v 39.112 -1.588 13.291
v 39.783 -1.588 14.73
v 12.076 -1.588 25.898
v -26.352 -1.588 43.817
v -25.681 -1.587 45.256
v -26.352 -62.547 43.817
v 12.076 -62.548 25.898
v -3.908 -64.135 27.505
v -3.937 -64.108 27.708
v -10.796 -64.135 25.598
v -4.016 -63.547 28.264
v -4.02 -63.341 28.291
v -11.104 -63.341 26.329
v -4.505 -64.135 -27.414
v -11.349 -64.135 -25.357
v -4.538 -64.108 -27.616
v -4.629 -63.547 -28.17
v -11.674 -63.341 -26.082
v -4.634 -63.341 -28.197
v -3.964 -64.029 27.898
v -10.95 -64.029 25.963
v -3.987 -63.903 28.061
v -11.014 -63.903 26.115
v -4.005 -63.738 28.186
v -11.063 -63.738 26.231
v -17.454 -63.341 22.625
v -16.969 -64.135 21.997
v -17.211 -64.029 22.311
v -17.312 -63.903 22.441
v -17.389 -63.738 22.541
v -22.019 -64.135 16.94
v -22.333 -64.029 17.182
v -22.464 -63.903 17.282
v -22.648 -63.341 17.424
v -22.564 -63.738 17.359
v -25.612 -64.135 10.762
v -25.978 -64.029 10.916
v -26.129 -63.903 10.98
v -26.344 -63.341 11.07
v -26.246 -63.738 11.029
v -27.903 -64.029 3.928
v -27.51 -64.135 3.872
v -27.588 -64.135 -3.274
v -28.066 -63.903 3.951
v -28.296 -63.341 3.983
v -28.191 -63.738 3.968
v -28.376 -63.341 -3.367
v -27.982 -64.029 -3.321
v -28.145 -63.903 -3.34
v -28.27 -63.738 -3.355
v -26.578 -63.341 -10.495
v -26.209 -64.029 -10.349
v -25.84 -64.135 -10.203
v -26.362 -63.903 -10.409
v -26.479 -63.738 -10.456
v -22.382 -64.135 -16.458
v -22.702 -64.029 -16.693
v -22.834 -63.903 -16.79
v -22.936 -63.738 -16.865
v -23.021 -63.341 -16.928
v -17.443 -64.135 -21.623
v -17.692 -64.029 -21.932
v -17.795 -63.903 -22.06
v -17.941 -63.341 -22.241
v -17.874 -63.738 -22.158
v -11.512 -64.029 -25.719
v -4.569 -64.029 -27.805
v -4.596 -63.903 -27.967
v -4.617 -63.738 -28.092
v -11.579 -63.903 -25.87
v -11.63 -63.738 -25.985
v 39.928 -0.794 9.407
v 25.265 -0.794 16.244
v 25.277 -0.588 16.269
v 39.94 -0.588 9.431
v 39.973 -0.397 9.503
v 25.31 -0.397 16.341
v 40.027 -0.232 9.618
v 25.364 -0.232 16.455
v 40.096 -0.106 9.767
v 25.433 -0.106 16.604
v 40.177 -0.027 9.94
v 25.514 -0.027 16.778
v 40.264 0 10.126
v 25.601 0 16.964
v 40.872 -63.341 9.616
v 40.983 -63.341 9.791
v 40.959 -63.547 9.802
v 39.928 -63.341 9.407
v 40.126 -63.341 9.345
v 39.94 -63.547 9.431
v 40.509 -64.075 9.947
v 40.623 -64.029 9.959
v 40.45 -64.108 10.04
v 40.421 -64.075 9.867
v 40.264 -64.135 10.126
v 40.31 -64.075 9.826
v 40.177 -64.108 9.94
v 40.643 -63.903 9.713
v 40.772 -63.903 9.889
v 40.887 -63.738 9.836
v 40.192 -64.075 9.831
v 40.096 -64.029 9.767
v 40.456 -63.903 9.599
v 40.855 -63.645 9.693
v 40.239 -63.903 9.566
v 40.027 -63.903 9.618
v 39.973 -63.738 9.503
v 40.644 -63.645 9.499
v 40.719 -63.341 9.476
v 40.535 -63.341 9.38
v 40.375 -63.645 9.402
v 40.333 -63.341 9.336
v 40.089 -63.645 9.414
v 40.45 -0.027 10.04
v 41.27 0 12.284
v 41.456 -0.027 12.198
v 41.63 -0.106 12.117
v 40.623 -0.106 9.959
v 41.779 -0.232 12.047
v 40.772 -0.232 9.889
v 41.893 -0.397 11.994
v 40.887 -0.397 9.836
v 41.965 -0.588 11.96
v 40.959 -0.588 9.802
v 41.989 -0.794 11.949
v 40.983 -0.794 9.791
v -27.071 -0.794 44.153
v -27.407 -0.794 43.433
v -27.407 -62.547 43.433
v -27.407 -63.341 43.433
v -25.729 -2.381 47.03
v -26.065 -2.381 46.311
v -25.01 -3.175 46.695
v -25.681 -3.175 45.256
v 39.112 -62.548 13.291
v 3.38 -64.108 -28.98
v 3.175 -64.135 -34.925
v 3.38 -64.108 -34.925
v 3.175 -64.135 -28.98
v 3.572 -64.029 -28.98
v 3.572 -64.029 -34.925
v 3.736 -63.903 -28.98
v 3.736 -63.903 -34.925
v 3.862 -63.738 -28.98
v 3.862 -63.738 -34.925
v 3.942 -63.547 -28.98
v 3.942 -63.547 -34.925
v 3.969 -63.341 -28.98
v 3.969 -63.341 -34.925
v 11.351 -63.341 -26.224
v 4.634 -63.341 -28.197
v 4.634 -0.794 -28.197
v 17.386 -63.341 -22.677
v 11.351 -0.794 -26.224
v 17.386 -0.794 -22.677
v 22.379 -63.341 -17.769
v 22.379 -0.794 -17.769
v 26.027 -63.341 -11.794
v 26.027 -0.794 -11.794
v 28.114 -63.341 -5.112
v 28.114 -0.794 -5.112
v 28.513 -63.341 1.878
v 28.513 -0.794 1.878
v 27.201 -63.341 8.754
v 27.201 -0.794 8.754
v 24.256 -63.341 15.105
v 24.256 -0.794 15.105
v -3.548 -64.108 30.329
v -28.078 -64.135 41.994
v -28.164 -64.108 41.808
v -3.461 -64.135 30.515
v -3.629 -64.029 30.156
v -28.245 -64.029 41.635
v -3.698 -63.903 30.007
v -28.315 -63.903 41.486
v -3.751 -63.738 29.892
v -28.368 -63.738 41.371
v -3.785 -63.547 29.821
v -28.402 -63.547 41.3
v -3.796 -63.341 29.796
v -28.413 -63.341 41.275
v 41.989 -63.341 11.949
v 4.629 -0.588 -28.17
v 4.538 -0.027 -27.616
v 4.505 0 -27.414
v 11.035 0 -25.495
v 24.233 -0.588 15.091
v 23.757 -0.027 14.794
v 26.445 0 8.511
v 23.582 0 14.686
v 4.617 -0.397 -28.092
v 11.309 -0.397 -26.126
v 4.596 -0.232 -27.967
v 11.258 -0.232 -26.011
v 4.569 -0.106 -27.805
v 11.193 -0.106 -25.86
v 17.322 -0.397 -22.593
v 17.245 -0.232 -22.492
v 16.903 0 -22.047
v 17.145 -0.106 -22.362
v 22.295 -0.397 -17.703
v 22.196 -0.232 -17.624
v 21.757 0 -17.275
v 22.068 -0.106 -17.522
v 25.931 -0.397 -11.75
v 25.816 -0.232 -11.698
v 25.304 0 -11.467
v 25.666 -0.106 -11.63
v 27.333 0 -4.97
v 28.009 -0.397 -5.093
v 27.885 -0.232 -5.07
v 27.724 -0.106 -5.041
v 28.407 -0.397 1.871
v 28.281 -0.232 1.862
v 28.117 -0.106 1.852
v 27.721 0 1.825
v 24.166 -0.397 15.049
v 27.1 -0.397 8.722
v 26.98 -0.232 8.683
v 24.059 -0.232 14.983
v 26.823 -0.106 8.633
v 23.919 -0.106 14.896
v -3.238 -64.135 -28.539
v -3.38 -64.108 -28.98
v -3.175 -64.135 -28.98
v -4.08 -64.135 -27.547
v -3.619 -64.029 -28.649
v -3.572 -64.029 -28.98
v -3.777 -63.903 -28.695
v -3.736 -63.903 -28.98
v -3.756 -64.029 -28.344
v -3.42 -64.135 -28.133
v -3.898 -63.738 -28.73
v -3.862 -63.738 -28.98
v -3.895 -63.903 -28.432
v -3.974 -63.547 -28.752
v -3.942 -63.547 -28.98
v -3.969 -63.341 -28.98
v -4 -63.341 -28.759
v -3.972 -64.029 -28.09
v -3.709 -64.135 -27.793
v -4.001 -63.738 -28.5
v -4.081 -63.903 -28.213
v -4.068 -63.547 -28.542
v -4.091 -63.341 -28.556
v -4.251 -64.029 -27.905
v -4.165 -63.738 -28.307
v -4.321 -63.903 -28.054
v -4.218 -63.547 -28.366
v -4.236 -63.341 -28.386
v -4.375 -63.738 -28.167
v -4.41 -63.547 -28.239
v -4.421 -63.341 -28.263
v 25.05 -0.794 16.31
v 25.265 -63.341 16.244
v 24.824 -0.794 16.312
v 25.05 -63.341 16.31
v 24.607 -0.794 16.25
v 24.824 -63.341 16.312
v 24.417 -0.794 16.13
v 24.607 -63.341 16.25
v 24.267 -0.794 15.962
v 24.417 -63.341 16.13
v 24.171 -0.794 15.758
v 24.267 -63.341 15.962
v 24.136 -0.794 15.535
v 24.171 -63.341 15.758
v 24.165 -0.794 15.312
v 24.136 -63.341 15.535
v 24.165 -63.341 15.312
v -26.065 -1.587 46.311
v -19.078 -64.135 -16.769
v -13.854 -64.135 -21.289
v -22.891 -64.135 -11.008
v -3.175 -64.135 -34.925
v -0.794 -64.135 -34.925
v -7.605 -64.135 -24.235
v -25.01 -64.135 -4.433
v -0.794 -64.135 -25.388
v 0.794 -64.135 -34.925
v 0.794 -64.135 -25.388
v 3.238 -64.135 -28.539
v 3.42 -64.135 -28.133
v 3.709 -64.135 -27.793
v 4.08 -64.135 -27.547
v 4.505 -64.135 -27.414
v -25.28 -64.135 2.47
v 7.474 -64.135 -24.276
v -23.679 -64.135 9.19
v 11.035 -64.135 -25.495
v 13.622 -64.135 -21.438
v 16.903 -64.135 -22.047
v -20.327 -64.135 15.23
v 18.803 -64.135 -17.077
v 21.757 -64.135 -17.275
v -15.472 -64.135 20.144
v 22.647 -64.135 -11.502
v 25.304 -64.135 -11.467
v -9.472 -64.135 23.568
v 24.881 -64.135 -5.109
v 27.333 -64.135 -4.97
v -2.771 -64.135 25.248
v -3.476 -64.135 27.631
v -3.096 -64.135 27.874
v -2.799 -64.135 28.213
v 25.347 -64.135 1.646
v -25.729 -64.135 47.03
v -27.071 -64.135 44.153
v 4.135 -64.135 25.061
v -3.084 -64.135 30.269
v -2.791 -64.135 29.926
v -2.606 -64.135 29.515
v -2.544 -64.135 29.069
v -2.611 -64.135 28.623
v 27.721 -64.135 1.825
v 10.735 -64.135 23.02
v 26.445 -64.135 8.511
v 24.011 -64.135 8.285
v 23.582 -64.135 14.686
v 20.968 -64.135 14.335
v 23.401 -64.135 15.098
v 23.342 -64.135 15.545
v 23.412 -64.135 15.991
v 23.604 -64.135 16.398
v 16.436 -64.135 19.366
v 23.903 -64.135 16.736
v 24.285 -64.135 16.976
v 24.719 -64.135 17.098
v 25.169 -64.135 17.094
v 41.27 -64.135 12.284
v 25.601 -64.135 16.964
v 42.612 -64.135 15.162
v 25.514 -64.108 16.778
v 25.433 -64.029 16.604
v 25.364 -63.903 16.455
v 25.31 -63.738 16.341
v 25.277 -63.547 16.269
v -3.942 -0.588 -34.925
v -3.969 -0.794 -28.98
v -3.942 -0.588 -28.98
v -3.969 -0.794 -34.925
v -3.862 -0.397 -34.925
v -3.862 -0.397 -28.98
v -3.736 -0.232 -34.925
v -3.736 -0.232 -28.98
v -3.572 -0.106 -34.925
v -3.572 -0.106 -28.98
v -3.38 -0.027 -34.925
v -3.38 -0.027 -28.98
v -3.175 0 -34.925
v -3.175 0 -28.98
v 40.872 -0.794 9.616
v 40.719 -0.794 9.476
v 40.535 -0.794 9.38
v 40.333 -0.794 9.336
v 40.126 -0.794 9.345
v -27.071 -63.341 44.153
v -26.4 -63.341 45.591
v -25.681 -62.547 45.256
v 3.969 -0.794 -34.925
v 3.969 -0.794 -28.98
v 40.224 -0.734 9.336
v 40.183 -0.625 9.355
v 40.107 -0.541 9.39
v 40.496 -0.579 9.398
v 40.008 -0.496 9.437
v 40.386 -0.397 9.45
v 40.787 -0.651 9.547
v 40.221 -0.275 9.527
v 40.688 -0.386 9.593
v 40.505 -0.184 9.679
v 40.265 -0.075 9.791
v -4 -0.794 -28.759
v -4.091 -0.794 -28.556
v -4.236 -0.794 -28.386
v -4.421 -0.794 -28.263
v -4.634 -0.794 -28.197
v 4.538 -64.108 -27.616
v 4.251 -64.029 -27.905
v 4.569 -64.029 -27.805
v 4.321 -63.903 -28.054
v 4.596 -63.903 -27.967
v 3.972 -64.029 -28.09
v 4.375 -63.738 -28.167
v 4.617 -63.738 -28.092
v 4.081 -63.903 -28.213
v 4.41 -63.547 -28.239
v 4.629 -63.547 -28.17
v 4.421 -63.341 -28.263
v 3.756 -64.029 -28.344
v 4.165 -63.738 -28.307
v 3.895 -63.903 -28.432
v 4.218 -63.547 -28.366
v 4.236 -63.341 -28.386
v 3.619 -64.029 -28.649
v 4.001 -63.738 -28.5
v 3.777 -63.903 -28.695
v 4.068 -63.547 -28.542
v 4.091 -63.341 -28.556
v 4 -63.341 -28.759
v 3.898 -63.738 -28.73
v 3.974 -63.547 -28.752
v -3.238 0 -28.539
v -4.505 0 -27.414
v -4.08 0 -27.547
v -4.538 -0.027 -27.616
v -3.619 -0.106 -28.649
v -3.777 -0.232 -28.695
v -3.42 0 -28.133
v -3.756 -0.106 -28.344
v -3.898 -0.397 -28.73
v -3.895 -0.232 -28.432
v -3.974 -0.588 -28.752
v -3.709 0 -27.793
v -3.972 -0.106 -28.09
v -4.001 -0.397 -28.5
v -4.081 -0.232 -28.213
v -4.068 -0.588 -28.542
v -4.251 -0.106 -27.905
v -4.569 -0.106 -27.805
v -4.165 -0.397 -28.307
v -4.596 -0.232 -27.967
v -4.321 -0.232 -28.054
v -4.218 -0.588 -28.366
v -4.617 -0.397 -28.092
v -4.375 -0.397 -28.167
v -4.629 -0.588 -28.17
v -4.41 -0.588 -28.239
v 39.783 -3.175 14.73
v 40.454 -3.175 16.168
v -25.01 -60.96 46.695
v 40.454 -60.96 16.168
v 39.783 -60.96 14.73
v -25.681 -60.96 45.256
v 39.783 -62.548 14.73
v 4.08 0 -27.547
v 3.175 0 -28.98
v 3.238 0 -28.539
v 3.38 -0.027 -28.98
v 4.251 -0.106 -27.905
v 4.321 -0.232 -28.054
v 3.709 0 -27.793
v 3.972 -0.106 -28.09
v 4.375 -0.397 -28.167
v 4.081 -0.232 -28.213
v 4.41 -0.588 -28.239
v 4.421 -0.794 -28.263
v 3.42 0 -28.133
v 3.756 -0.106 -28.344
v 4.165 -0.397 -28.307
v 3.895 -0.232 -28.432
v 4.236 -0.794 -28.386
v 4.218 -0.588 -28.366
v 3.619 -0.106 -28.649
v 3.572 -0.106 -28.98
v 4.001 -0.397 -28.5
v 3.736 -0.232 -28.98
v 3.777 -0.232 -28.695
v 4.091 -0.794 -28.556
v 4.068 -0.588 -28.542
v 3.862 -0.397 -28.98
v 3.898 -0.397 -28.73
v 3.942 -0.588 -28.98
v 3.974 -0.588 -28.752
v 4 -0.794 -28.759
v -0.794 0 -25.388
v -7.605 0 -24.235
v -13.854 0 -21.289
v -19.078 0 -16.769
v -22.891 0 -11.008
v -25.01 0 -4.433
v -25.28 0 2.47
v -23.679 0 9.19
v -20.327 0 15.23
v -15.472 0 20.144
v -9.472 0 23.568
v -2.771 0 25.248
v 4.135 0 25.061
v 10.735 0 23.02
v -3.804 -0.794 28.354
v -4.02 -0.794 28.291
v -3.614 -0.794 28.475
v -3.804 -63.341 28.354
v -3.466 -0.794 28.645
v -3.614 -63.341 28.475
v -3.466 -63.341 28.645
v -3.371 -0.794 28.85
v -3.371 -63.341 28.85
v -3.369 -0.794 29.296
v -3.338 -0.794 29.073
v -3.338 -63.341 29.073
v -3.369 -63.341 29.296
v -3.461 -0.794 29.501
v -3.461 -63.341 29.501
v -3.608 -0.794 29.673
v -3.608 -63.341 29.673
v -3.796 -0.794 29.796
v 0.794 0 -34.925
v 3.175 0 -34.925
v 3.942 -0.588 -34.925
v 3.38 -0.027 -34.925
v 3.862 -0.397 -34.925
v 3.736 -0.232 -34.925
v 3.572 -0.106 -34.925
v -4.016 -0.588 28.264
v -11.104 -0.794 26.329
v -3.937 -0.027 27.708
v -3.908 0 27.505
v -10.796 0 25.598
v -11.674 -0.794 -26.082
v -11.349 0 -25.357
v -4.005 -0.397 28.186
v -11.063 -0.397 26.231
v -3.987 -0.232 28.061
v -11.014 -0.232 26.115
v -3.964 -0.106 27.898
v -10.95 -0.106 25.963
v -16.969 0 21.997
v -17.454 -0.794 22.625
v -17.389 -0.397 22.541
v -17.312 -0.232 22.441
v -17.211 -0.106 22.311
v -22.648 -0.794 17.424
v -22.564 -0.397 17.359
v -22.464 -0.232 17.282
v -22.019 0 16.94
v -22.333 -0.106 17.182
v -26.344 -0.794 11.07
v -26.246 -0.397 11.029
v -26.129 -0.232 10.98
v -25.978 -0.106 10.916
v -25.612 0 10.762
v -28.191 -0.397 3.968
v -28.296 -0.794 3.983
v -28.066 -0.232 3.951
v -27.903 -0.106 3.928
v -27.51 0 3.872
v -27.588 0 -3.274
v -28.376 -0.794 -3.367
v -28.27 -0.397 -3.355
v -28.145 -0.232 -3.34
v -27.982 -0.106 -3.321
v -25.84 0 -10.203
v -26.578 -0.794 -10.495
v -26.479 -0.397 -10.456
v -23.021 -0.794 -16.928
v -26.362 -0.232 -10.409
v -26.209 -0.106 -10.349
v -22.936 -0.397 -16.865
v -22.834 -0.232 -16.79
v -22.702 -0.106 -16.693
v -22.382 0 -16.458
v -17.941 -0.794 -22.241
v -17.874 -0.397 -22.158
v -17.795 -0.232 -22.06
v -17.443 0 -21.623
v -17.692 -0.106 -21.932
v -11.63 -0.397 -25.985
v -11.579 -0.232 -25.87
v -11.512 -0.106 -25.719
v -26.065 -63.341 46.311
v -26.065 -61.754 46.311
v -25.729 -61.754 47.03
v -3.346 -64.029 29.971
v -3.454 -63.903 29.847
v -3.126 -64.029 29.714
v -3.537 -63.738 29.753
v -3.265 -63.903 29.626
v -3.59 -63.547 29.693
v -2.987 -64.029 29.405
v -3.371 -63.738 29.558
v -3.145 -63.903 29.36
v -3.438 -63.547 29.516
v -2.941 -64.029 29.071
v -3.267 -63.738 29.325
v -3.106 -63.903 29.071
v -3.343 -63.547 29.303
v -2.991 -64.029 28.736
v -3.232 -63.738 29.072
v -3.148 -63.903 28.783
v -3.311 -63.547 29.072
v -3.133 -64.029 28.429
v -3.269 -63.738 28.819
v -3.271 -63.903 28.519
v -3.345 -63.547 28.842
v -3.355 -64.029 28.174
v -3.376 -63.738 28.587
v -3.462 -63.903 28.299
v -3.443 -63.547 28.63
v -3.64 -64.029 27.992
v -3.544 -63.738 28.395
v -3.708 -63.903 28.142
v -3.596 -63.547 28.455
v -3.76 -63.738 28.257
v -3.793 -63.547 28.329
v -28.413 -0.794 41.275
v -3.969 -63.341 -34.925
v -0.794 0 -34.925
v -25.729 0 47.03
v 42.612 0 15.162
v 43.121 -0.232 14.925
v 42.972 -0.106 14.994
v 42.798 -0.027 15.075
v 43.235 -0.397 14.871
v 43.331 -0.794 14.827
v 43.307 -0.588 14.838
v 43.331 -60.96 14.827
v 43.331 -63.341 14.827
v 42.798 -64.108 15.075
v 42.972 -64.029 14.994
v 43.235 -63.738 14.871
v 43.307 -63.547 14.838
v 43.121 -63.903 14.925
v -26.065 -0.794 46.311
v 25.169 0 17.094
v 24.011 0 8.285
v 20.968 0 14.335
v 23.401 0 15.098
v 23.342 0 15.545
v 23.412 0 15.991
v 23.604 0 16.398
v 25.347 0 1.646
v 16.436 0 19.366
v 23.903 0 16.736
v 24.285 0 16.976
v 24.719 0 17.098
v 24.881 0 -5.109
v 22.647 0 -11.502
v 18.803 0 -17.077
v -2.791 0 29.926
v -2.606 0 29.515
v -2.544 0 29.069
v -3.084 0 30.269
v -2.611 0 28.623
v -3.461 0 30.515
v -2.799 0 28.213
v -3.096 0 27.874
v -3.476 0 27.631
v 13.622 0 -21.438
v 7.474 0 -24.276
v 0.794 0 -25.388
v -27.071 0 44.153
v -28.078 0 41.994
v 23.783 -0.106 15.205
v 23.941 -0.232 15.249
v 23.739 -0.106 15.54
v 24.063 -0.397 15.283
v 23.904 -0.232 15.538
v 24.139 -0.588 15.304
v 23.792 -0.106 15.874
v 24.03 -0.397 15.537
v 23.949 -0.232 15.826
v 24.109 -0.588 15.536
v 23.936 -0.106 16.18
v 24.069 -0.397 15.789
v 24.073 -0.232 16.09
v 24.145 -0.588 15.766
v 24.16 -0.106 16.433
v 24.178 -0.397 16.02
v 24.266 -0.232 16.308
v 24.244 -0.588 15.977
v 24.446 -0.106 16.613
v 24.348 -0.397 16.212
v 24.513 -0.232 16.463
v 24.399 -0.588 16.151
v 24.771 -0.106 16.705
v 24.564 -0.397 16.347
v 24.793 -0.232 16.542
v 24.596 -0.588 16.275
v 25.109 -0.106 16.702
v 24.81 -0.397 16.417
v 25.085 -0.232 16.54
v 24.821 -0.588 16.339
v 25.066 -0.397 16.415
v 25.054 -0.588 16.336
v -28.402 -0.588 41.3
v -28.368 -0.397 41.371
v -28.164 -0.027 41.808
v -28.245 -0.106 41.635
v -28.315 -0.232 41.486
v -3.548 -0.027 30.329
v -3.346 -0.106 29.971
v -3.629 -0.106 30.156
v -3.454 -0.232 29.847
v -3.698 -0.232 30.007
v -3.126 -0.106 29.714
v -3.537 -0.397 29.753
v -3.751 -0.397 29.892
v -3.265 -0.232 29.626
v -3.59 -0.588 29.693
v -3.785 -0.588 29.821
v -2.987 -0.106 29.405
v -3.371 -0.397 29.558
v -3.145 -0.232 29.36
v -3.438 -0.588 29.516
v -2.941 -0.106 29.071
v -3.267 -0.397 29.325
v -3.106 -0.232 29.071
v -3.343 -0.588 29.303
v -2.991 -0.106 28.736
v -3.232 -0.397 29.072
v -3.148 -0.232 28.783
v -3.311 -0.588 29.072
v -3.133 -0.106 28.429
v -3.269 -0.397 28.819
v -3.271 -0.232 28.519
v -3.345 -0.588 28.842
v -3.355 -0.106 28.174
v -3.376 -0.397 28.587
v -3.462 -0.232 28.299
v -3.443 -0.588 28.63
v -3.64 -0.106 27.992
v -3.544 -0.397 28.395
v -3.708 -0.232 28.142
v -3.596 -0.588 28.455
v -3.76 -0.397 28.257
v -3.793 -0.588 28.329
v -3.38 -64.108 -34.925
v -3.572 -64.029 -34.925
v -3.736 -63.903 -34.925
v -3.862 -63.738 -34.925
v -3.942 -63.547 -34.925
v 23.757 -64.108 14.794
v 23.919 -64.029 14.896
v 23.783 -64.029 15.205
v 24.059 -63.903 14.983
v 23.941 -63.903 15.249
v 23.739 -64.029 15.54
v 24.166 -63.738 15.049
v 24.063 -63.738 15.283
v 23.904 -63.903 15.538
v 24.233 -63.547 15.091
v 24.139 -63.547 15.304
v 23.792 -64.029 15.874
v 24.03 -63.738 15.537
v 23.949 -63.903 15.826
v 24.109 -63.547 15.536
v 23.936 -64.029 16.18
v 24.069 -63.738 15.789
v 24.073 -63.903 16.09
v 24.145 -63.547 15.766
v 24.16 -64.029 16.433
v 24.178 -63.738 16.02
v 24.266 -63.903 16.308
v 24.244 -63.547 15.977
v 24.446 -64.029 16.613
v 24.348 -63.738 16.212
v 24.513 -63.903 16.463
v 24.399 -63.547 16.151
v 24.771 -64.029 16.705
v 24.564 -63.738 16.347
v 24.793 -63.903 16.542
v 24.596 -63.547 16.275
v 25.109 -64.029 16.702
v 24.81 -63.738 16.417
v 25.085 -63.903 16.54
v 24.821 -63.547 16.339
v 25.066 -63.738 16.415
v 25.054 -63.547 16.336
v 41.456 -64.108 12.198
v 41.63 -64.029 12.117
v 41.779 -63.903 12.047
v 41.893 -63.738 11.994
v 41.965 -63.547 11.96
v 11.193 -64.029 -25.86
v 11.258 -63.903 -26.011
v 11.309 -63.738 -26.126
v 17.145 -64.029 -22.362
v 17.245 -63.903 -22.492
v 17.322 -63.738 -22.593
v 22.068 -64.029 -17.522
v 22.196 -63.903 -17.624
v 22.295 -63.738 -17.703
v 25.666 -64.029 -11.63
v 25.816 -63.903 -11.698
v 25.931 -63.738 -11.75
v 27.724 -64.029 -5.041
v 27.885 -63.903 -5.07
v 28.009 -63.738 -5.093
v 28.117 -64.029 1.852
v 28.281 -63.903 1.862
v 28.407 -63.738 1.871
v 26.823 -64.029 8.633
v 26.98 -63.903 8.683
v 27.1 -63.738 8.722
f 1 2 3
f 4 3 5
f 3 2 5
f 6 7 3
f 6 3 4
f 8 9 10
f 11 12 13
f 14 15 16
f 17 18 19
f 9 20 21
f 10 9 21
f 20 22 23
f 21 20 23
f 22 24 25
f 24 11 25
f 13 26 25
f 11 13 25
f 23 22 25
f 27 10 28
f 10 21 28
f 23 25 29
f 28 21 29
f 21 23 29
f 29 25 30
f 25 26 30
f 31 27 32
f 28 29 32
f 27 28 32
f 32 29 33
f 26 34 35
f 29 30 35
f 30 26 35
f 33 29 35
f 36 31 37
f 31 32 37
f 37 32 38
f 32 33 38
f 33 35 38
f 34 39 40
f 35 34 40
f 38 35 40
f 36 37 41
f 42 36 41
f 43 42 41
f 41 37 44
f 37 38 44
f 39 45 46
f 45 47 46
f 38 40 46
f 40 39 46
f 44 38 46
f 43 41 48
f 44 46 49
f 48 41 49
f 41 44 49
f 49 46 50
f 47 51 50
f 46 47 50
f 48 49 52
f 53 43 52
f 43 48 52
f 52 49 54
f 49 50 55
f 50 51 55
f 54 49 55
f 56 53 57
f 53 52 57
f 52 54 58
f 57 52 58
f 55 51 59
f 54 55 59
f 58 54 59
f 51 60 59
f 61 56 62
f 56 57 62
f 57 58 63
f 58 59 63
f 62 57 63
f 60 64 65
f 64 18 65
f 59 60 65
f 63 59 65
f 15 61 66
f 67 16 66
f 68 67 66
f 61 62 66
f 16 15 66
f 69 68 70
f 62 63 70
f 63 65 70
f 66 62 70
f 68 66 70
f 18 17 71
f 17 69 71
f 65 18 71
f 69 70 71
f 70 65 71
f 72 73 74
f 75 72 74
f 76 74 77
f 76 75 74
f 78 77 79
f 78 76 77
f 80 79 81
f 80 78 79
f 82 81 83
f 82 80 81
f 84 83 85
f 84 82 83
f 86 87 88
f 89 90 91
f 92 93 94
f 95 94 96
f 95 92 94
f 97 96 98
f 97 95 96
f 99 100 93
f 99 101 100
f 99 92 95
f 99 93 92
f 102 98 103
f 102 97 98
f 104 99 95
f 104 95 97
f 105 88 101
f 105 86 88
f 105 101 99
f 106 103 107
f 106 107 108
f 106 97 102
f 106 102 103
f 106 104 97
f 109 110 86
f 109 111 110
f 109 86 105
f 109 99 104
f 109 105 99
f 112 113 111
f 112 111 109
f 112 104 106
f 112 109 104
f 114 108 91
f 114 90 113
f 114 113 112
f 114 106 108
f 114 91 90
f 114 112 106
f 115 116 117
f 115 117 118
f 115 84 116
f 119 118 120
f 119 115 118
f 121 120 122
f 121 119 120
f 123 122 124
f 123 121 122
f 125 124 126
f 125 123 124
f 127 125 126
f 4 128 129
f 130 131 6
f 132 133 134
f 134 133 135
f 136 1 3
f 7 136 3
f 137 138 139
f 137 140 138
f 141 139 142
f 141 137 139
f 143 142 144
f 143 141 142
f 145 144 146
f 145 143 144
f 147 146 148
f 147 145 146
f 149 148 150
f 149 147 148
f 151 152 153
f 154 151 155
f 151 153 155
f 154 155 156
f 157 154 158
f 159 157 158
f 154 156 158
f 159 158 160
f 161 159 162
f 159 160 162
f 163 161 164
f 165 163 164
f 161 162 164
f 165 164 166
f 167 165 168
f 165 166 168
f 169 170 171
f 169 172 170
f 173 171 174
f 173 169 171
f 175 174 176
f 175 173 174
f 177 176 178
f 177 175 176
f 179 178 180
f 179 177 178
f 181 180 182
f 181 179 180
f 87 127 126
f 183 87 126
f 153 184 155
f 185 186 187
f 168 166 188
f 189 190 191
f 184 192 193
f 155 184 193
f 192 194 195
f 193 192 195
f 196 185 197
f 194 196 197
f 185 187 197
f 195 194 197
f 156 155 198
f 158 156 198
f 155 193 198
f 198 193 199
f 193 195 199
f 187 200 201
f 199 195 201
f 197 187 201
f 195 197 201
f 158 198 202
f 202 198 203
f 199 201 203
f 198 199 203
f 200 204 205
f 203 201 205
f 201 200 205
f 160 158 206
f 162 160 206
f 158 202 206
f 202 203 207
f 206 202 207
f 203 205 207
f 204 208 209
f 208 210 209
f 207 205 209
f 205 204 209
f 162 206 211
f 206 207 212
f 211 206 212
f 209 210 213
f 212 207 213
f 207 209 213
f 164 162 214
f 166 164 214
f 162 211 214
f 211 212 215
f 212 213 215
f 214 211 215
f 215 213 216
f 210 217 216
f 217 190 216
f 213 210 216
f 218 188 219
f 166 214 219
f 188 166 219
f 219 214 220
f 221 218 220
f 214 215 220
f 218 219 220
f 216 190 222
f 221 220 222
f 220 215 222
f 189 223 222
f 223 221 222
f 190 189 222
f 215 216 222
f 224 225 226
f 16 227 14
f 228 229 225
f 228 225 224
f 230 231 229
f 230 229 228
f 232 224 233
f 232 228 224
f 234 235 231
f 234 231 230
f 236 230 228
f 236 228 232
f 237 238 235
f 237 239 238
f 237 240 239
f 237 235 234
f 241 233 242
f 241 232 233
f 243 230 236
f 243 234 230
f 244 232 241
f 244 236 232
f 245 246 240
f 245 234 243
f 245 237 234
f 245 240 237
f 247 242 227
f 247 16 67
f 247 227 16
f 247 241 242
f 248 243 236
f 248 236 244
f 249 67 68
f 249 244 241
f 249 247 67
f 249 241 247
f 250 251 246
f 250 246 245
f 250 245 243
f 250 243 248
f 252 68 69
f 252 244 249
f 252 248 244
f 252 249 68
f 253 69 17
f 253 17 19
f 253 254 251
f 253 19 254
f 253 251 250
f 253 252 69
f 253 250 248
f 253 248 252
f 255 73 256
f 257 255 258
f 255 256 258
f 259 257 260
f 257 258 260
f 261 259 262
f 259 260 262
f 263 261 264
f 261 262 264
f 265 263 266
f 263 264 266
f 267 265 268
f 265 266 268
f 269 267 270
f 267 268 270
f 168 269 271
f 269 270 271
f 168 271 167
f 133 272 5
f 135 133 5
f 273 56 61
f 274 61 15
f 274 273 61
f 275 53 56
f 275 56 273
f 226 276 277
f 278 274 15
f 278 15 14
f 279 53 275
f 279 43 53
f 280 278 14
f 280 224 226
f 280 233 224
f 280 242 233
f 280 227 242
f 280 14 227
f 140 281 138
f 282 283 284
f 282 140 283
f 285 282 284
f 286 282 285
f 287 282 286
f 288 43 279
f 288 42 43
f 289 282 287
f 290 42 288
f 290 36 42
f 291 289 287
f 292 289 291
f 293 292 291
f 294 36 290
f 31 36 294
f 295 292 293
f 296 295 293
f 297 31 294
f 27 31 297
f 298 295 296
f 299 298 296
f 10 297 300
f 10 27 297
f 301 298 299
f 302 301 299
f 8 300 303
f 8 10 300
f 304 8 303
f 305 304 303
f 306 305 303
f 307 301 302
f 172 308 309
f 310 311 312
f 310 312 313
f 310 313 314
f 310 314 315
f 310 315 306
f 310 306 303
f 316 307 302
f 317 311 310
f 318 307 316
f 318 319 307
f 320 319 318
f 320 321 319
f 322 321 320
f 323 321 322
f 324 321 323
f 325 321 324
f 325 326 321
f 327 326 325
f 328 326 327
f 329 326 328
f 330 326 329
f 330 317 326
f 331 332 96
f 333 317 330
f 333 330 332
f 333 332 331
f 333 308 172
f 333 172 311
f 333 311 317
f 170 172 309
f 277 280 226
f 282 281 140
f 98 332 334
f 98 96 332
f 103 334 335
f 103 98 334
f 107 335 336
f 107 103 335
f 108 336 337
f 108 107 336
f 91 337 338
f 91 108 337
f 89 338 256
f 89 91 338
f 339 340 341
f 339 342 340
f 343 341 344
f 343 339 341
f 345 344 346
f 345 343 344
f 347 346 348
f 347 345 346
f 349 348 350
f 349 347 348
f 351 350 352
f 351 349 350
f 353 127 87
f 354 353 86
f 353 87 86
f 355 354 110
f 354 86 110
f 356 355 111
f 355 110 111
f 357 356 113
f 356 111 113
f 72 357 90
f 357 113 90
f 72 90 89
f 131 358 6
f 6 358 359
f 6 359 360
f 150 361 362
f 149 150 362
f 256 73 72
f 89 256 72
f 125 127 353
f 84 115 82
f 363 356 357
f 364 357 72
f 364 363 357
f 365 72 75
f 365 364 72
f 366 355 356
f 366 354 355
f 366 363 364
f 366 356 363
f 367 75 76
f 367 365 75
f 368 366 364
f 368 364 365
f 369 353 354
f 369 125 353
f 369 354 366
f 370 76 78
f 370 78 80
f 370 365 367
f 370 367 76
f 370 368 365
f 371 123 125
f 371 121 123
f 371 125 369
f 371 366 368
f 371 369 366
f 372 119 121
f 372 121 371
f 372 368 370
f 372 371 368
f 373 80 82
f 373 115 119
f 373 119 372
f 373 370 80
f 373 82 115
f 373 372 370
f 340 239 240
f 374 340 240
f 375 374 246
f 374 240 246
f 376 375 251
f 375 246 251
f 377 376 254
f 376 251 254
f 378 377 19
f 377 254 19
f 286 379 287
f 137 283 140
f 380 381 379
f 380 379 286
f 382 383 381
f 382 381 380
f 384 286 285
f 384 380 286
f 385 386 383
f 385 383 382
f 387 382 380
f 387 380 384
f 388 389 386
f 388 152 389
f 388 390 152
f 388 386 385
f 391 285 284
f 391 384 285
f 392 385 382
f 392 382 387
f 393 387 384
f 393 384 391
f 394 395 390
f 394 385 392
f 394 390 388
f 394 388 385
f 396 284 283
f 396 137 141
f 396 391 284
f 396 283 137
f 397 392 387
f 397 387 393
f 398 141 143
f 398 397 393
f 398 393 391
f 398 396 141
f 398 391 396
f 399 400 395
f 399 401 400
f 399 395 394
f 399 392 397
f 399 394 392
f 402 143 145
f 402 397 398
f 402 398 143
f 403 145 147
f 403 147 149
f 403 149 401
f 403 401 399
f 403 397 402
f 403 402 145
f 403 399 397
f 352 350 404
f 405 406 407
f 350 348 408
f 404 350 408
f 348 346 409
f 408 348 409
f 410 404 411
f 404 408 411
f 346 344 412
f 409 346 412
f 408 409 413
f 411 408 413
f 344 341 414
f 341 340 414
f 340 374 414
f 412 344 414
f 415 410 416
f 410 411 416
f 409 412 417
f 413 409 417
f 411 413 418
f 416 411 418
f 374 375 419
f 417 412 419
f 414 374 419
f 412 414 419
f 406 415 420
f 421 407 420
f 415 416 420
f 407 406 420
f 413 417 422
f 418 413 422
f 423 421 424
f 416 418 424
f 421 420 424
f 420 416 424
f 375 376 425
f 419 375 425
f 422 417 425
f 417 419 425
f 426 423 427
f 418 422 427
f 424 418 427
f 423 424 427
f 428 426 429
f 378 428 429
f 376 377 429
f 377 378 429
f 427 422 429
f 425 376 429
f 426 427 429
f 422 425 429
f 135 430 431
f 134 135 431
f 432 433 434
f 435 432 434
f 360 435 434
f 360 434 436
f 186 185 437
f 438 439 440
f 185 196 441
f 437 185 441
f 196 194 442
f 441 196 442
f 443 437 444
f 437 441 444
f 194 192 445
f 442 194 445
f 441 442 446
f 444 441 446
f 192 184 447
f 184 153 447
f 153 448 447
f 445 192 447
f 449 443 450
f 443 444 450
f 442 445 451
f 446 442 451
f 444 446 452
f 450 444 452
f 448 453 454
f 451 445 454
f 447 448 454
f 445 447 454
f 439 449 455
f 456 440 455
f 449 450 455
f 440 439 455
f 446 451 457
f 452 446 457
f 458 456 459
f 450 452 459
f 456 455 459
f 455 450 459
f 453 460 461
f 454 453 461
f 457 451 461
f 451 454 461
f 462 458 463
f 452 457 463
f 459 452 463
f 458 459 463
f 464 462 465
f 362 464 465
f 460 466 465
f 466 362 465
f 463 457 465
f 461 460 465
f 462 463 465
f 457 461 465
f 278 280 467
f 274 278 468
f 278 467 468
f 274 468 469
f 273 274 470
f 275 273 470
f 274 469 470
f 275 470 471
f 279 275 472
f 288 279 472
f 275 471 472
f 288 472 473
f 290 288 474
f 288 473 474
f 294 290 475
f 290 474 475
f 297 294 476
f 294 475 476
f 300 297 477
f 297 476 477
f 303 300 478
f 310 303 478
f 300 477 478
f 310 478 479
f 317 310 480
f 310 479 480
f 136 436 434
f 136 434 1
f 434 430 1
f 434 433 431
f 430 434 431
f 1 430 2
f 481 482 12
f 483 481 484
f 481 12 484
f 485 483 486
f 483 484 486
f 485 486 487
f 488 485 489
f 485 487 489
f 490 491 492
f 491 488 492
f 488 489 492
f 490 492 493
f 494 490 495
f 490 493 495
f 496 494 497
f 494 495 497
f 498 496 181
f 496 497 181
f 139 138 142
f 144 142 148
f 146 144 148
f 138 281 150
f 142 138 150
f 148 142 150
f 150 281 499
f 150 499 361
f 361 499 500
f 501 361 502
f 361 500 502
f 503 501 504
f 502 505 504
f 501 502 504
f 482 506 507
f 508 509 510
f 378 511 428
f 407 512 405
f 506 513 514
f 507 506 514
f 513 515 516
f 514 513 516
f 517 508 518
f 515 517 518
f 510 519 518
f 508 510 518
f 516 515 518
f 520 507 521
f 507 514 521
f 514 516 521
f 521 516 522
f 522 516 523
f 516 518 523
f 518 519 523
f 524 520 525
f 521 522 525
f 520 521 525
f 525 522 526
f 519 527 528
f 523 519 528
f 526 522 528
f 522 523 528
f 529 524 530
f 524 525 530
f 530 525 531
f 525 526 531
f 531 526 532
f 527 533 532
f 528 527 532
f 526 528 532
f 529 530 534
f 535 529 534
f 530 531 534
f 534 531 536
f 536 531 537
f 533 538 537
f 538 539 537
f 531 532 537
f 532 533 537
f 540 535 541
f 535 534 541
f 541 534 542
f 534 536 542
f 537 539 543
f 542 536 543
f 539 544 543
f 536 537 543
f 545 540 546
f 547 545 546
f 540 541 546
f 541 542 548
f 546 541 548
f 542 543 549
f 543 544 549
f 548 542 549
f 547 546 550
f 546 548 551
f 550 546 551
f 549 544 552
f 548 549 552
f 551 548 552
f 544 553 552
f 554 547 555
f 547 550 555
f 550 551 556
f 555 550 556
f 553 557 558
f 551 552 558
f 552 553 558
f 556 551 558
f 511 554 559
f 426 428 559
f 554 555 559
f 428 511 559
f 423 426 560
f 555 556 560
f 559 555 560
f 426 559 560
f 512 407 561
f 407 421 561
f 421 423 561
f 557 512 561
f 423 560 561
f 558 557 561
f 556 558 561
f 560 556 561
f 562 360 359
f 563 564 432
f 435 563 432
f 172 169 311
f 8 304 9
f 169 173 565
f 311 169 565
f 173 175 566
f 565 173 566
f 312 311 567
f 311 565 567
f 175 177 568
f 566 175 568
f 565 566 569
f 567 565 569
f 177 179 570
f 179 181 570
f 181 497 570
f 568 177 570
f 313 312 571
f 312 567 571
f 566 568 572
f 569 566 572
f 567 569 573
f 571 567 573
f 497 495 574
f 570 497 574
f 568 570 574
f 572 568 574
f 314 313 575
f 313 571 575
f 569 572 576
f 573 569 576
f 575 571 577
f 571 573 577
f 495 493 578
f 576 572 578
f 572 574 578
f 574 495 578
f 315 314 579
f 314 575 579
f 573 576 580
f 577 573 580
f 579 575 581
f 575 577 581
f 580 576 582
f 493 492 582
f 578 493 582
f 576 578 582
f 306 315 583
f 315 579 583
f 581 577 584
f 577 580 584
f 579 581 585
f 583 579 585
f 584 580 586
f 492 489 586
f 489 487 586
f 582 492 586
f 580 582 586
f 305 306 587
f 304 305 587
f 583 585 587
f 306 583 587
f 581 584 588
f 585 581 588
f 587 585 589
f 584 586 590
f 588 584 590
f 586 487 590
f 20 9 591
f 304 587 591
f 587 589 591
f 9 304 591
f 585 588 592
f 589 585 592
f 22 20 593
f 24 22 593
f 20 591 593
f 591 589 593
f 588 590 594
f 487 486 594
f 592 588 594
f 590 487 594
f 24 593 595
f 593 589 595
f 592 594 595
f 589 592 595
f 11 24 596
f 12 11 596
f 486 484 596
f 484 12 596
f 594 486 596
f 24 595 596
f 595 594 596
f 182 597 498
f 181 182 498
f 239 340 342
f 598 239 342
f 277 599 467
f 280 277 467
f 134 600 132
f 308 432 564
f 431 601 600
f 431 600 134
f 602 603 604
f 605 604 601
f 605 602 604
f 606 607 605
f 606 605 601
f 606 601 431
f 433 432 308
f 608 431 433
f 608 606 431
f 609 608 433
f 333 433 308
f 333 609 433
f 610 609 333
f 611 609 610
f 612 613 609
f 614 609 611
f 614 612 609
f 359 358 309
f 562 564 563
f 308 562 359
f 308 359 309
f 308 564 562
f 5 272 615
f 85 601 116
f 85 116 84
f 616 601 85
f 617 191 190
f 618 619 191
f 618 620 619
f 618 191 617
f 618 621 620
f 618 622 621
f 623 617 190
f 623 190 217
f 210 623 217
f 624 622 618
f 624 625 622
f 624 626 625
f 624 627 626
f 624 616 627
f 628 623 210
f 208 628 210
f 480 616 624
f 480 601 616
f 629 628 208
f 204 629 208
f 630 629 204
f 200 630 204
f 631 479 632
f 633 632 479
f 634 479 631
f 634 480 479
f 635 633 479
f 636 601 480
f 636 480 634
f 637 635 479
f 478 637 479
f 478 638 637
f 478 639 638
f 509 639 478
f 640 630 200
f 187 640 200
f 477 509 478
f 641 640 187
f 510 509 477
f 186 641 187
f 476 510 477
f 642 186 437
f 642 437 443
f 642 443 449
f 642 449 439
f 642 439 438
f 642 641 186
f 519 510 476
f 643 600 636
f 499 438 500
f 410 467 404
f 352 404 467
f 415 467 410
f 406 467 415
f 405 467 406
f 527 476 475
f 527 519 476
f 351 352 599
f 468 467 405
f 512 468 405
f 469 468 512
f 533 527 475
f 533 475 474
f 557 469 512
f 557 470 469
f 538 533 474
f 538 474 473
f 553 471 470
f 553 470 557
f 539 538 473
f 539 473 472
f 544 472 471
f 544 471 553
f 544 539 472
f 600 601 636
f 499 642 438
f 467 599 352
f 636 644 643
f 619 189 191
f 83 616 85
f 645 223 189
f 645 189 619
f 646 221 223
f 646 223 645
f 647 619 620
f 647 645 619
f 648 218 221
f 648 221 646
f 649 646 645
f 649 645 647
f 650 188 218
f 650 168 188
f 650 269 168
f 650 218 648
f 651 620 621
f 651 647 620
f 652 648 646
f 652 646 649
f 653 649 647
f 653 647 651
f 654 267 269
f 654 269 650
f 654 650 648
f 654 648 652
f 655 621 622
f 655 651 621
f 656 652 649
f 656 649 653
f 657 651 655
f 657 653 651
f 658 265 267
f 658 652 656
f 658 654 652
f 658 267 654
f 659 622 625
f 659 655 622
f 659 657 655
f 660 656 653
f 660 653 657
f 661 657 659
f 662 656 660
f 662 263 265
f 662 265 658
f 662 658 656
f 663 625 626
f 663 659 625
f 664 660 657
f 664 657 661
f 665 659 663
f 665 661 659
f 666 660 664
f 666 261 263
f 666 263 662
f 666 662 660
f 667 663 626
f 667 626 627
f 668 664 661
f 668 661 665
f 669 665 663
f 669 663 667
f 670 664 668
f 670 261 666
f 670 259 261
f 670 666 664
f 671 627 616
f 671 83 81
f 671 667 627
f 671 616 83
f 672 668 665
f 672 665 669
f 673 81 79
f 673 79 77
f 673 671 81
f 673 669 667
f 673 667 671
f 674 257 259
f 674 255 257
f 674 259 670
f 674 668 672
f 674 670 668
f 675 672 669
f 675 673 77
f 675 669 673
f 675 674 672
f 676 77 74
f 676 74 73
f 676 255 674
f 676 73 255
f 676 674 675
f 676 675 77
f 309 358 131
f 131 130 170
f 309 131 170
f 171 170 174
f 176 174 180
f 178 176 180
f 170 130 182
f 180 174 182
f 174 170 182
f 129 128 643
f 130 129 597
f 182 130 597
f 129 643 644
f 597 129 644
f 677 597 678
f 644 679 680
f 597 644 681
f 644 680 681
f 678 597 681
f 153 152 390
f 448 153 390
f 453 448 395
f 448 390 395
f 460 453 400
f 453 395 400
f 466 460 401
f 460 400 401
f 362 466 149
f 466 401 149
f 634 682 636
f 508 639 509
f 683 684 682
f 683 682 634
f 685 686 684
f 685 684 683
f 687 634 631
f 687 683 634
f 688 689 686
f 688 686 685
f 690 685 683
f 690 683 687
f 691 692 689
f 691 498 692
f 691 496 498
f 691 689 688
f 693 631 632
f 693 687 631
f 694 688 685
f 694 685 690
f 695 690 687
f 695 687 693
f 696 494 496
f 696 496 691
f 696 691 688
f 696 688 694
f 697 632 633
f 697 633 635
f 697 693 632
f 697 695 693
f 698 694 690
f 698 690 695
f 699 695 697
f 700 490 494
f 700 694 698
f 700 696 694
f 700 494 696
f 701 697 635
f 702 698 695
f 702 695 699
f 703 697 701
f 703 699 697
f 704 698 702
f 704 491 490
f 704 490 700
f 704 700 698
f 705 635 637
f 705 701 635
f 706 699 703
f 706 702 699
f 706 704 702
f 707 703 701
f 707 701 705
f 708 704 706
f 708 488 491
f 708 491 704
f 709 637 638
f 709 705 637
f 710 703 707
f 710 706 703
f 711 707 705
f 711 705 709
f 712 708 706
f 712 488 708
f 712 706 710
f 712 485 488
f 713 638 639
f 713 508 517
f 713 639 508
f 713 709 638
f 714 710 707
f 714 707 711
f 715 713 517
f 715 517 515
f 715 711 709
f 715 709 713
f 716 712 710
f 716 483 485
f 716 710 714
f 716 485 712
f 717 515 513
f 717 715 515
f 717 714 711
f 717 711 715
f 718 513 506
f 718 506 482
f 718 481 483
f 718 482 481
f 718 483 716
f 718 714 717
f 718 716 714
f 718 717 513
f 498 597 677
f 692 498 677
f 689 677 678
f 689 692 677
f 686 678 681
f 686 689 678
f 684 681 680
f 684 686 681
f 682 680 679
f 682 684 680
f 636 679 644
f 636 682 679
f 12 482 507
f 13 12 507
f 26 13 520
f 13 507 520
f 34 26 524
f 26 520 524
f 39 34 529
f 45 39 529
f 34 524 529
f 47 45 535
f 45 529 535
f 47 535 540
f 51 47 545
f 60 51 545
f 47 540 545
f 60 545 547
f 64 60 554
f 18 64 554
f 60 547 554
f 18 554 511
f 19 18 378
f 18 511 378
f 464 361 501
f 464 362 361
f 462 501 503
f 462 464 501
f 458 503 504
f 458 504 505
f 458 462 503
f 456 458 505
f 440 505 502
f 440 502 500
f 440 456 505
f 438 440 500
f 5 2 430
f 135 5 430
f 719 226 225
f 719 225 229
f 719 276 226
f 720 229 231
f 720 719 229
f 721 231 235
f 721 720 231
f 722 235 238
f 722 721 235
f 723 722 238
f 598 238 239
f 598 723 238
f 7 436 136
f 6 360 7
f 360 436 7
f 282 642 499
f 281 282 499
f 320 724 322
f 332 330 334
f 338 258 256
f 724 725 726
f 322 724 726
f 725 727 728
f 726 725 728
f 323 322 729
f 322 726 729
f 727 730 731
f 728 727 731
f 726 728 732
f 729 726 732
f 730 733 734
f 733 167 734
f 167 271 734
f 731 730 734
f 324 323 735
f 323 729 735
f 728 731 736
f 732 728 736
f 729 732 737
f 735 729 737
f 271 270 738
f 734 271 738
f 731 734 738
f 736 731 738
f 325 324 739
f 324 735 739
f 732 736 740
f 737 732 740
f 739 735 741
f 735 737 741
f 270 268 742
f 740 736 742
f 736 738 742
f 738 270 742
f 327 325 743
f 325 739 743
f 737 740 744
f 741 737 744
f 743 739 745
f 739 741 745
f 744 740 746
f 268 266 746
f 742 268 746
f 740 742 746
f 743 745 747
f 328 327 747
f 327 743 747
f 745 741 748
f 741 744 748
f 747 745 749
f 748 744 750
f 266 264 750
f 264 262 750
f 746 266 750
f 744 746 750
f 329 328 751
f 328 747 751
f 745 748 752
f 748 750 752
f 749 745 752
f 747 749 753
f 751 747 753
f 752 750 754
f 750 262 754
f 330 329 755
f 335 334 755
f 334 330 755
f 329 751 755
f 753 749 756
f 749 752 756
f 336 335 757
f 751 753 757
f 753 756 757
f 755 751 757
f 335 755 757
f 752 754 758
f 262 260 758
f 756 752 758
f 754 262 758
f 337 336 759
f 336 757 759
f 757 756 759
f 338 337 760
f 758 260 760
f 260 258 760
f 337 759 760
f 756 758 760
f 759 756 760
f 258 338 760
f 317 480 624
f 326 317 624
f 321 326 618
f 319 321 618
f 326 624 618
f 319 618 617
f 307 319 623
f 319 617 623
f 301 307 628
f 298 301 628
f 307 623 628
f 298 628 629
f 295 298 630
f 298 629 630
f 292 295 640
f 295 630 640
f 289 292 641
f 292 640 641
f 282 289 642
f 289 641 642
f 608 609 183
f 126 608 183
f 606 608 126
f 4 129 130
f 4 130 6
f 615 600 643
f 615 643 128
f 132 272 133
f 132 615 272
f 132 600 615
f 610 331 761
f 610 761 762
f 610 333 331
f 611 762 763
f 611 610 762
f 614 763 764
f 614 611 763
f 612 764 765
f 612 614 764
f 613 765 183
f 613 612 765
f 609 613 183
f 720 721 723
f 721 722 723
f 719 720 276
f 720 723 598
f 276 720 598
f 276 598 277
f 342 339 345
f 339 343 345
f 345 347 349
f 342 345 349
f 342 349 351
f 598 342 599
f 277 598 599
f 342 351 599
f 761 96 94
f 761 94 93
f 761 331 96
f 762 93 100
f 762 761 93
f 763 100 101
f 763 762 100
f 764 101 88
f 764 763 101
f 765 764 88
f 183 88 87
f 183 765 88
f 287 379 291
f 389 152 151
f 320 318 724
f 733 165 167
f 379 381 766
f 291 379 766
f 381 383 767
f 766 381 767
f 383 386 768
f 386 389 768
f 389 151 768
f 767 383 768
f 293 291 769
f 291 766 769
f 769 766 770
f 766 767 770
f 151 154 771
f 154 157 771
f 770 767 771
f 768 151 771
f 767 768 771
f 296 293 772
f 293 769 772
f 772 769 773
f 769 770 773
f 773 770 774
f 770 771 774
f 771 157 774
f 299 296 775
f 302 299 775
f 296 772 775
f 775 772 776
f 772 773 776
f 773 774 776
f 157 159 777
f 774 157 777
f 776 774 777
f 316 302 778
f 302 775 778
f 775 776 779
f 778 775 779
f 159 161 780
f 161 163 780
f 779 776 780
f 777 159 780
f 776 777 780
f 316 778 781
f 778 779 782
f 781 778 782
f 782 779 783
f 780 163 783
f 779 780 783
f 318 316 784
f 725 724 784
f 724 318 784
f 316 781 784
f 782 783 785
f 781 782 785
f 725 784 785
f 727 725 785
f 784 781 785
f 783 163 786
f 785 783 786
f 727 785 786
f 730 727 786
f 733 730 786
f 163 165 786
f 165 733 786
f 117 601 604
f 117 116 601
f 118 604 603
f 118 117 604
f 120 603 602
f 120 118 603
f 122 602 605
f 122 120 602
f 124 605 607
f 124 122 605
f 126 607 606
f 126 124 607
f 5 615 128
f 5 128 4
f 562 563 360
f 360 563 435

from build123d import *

# Parameters (mm, degrees)
F1_DEPTH     = 64.135
F3_DEPTH     = 76.2
F5_DEPTH     = 3.175
F6_R         = 0.79375
F7_T1_DEPTH  = 3.6287733717
F7_T6_DEPTH  = 4.4225233717
F7_T8_DEPTH  = 4.8762967434
F7_T13_DEPTH = 63.7950233717
F7_T18_DEPTH = 4.4225233717
F7_T23_DEPTH = 6.4637967434
F7_T25_DEPTH = 4.8762967434


# Not quite as in the source:
# - a fillet or chamfer that OpenCascade refuses, or shapes differently, is made with other operations: its cross-section is extruded or revolved along the edge and cut away or added


with BuildPart() as f1:
    # F0 (on Front) → F1 (new body)
    with BuildSketch(Plane.XZ):
        with BuildLine():
            ThreePointArc((10.7345036748, 23.0202178716), (24.8808005482, -5.1093800095), (0.79375, -25.3875946269))
            Line((0.79375, -25.3875946269), (0.79375, -28.563973567))
            ThreePointArc((0.79375, -28.563973567), (2.3849591955, -28.4752979727), (3.96875, -28.2980502586))
            ThreePointArc((3.96875, -28.2980502586), (26.4678099831, -10.7696638619), (22.5988525327, 17.4877811401))
            Line((22.5988525327, 17.4877811401), (10.7345036748, 23.0202178716))
        make_face()
        with BuildLine():
            Line((-1.1298448363, 28.5526544413), (10.7345036748, 23.0202178716))
            Line((10.7345036748, 23.0202178716), (22.5988525327, 17.4877811401))
            ThreePointArc((22.5988525327, 17.4877811401), (17.8402275241, 22.3216689987), (12.0763169886, 25.8977449403))
            ThreePointArc((12.0763169886, 25.8977449403), (5.6319134635, 28.0144993841), (-1.1298448363, 28.5526544413))
        make_face()
        with BuildLine():
            ThreePointArc((-0.79375, -25.3875946269), (-24.708980627, 5.8844096028), (10.7345036748, 23.0202178716))
            Line((10.7345036748, 23.0202178716), (-1.1298448363, 28.5526544413))
            ThreePointArc((-1.1298448363, 28.5526544413), (-28.5394389143, 1.4251496253), (-3.96875, -28.2980502586))
            ThreePointArc((-3.96875, -28.2980502586), (-2.3849591955, -28.4752979727), (-0.79375, -28.563973567))
            Line((-0.79375, -28.563973567), (-0.79375, -25.3875946269))
        make_face()
        with BuildLine():
            ThreePointArc((3.96875, -28.2980502586), (2.3849591955, -28.4752979727), (0.79375, -28.563973567))
            Line((0.79375, -28.563973567), (0.79375, -34.925))
            Line((0.79375, -34.925), (3.96875, -34.925))
            Line((3.96875, -34.925), (3.96875, -28.2980502586))
        make_face()
        with BuildLine():
            ThreePointArc((12.0763169886, 25.8977449403), (17.8402275241, 22.3216689987), (22.5988525327, 17.4877811401))
            Line((22.5988525327, 17.4877811401), (40.6476504402, 9.0714884554))
            Line((40.6476504402, 9.0714884554), (41.9894634213, 11.9490156792))
            Line((41.9894634213, 11.9490156792), (12.0763169886, 25.8977449403))
        make_face()
        with BuildLine():
            Line((-28.413002932, 41.275), (-1.1298448363, 28.5526544413))
            ThreePointArc((-1.1298448363, 28.5526544413), (5.6319134635, 28.0144993841), (12.0763169886, 25.8977449403))
            Line((12.0763169886, 25.8977449403), (-27.0711899509, 44.1525272238))
            Line((-27.0711899509, 44.1525272238), (-28.413002932, 41.275))
        make_face()
        with BuildLine():
            Line((-0.79375, -34.925), (-0.79375, -28.563973567))
            ThreePointArc((-0.79375, -28.563973567), (-2.3849591955, -28.4752979727), (-3.96875, -28.2980502586))
            Line((-3.96875, -28.2980502586), (-3.96875, -34.925))
            Line((-3.96875, -34.925), (-0.79375, -34.925))
        make_face()
    extrude(amount=F1_DEPTH)

    # F2 (on face) → F3 (join, through all)
    with BuildSketch(Plane(origin=(-39.1475067802, 0, 18.2547822093), x_dir=(0, -1, 0), z_dir=(-0.906307787, 0, 0.4226182617))):
        Polygon((0, 31.75), (0, 28.575), (1.5875, 28.575), (1.5875, 30.1625), (3.175, 30.1625), (3.175, 31.75), align=None)
        Polygon((62.5475, 30.1625), (62.5475, 28.575), (64.135, 28.575), (64.135, 31.75), (60.96, 31.75), (60.96, 30.1625), align=None)
    extrude(amount=-F3_DEPTH)

    # F4 (on face) → F5 (join)
    with BuildSketch(Plane(origin=(29.913146592, 0, -13.9487293354), x_dir=(0, 1, 0), z_dir=(0.906307787, 0, -0.4226182617))):
        Polygon((-3.175, 31.75), (-60.96, 31.75), (-60.96, 30.1625), (-62.5475, 30.1625), (-62.5475, 28.575), (-1.5875, 28.575), (-1.5875, 30.1625), (-3.175, 30.1625), align=None)
    extrude(amount=-F5_DEPTH)

    # F6
    f6_edges = [f1.edges().sort_by_distance(p)[0] for p in [
        (-28.539439, 0, 1.42515),
        (-28.539439, -64.135, 1.42515),
        (-1.129845, -32.0675, 28.552654),
        (-3.96875, -32.0675, -28.29805),
        (22.598853, -32.0675, 17.487781),
        (3.96875, -32.0675, -28.29805),
        (26.46781, 0, -10.769664),
        (26.46781, -64.135, -10.769664),
        (41.989463, 0, 11.949016),
        (40.64765, -32.0675, 9.071488),
        (41.989463, -64.135, 11.949016),
        (3.96875, -64.135, -31.611525),
        (31.623251, -64.135, 13.279635),
        (-14.771424, -64.135, 34.913827),
        (-3.96875, -64.135, -31.611525),
        (-3.96875, 0, -31.611525),
        (-14.771424, 0, 34.913827),
        (31.623251, 0, 13.279635),
        (3.96875, 0, -31.611525),
    ]]
    fillet(f6_edges, radius=F6_R)

    # F7: chamfer of 0.79375 on 7 edges, made by hand

    # F7_s2 → F7_t1 (cut)
    with BuildSketch(Plane.XZ.offset(1.5875)):
        Polygon((-26.0648302152, 46.3106726417), (-25.6809016545, 45.2558375905), (-26.4002834604, 45.5912908358), align=None)
    extrude(amount=F7_T1_DEPTH, mode=Mode.SUBTRACT)


with BuildPart() as f7_tool4:
    # F7_s5 → F7_t6 (new body)
    with BuildSketch(Plane(origin=(12.0763168292, 0, 25.8977450146), x_dir=(0, 1, 0), z_dir=(0.4226182617, 0, 0.906307787))):
        Polygon((-0.79375, 43.1944945637), (-1.5875, 42.4007445637), (-1.5875, 43.1944945637), align=None)
    extrude(amount=F7_T6_DEPTH)

    split(bisect_by=Plane(origin=(-8.131860996, 0, -2.9597553517), x_dir=(0, 1, 0), z_dir=(-0.9396926208, 0, -0.3420201433)), keep=Keep.TOP)


with BuildPart() as f1_1:
    add(f1.part)

    # F7_t3: cut F7_tool4
    add(f7_tool4.part, mode=Mode.SUBTRACT)

    # F7_s9 → F7_t8 (cut)
    with BuildSketch(Plane(origin=(12.2199971609, 0, 26.2058684802), x_dir=(0, 1, 0), z_dir=(0.4226182617, 0, 0.906307787))):
        Polygon((-2.38125, 43.1944945637), (-3.175, 42.4007445637), (-3.175, 43.1944945637), align=None)
    extrude(amount=F7_T8_DEPTH, mode=Mode.SUBTRACT)


with BuildPart() as f7_tool11:
    # F7_s12 → F7_t13 (new body)
    with BuildSketch(Plane.XZ.offset(62.5475)):
        Polygon((-27.4066431962, 43.4331454179), (-26.351808145, 43.8170739786), (-27.0711899509, 44.1525272238), align=None)
    extrude(amount=-F7_T13_DEPTH)

    split(bisect_by=Plane(origin=(-19.9334442931, -21.9941222818, 9.2951177273), x_dir=(0.7409656453, -0.6715429342, 0), z_dir=(-0.6408563821, -0.7071067812, 0.2988362387)), keep=Keep.TOP)


with BuildPart() as f1_2:
    add(f1_1.part)

    # F7_t10: cut F7_tool11
    add(f7_tool11.part, mode=Mode.SUBTRACT)


with BuildPart() as f7_tool16:
    # F7_s17 → F7_t18 (new body)
    with BuildSketch(Plane(origin=(12.7472233198, 0, 27.3365086265), x_dir=(0, 1, 0), z_dir=(-0.4226182617, 0, -0.906307787))):
        Polygon((-63.34125, -43.1944945637), (-62.5475, -42.4007445637), (-62.5475, -43.1944945637), align=None)
    extrude(amount=F7_T18_DEPTH)

    split(bisect_by=Plane(origin=(-17.1651120978, 0, 47.160757891), x_dir=(0, 1, 0), z_dir=(-0.3420201433, 0, 0.9396926208)), keep=Keep.TOP)


with BuildPart() as f1_3:
    add(f1_2.part)

    # F7_t15: cut F7_tool16
    add(f7_tool16.part, mode=Mode.SUBTRACT)


with BuildPart() as f7_tool21:
    # F7_s22 → F7_t23 (new body)
    with BuildSketch(Plane.XZ.offset(58.9187266283)):
        Polygon((-26.0648302152, 46.3106726417), (-25.6809016545, 45.2558375905), (-26.4002834604, 45.5912908358), align=None)
    extrude(amount=F7_T23_DEPTH)

    split(bisect_by=Plane(origin=(9.1295806677, -10.0733777182, -4.2571933811), x_dir=(-0.7409656453, -0.6715429342, 0), z_dir=(-0.6408563821, 0.7071067812, 0.2988362387)), keep=Keep.TOP)


with BuildPart() as f1_4:
    add(f1_3.part)

    # F7_t20: cut F7_tool21
    add(f7_tool21.part, mode=Mode.SUBTRACT)

    # F7_s26 → F7_t25 (cut)
    with BuildSketch(Plane(origin=(14.2808092144, 0, 30.6252941907), x_dir=(0, 1, 0), z_dir=(-0.4226182617, 0, -0.906307787))):
        Polygon((-61.75375, -43.1944945637), (-60.96, -42.4007445637), (-60.96, -43.1944945637), align=None)
    extrude(amount=F7_T25_DEPTH, mode=Mode.SUBTRACT)


solid = f1_4.part
